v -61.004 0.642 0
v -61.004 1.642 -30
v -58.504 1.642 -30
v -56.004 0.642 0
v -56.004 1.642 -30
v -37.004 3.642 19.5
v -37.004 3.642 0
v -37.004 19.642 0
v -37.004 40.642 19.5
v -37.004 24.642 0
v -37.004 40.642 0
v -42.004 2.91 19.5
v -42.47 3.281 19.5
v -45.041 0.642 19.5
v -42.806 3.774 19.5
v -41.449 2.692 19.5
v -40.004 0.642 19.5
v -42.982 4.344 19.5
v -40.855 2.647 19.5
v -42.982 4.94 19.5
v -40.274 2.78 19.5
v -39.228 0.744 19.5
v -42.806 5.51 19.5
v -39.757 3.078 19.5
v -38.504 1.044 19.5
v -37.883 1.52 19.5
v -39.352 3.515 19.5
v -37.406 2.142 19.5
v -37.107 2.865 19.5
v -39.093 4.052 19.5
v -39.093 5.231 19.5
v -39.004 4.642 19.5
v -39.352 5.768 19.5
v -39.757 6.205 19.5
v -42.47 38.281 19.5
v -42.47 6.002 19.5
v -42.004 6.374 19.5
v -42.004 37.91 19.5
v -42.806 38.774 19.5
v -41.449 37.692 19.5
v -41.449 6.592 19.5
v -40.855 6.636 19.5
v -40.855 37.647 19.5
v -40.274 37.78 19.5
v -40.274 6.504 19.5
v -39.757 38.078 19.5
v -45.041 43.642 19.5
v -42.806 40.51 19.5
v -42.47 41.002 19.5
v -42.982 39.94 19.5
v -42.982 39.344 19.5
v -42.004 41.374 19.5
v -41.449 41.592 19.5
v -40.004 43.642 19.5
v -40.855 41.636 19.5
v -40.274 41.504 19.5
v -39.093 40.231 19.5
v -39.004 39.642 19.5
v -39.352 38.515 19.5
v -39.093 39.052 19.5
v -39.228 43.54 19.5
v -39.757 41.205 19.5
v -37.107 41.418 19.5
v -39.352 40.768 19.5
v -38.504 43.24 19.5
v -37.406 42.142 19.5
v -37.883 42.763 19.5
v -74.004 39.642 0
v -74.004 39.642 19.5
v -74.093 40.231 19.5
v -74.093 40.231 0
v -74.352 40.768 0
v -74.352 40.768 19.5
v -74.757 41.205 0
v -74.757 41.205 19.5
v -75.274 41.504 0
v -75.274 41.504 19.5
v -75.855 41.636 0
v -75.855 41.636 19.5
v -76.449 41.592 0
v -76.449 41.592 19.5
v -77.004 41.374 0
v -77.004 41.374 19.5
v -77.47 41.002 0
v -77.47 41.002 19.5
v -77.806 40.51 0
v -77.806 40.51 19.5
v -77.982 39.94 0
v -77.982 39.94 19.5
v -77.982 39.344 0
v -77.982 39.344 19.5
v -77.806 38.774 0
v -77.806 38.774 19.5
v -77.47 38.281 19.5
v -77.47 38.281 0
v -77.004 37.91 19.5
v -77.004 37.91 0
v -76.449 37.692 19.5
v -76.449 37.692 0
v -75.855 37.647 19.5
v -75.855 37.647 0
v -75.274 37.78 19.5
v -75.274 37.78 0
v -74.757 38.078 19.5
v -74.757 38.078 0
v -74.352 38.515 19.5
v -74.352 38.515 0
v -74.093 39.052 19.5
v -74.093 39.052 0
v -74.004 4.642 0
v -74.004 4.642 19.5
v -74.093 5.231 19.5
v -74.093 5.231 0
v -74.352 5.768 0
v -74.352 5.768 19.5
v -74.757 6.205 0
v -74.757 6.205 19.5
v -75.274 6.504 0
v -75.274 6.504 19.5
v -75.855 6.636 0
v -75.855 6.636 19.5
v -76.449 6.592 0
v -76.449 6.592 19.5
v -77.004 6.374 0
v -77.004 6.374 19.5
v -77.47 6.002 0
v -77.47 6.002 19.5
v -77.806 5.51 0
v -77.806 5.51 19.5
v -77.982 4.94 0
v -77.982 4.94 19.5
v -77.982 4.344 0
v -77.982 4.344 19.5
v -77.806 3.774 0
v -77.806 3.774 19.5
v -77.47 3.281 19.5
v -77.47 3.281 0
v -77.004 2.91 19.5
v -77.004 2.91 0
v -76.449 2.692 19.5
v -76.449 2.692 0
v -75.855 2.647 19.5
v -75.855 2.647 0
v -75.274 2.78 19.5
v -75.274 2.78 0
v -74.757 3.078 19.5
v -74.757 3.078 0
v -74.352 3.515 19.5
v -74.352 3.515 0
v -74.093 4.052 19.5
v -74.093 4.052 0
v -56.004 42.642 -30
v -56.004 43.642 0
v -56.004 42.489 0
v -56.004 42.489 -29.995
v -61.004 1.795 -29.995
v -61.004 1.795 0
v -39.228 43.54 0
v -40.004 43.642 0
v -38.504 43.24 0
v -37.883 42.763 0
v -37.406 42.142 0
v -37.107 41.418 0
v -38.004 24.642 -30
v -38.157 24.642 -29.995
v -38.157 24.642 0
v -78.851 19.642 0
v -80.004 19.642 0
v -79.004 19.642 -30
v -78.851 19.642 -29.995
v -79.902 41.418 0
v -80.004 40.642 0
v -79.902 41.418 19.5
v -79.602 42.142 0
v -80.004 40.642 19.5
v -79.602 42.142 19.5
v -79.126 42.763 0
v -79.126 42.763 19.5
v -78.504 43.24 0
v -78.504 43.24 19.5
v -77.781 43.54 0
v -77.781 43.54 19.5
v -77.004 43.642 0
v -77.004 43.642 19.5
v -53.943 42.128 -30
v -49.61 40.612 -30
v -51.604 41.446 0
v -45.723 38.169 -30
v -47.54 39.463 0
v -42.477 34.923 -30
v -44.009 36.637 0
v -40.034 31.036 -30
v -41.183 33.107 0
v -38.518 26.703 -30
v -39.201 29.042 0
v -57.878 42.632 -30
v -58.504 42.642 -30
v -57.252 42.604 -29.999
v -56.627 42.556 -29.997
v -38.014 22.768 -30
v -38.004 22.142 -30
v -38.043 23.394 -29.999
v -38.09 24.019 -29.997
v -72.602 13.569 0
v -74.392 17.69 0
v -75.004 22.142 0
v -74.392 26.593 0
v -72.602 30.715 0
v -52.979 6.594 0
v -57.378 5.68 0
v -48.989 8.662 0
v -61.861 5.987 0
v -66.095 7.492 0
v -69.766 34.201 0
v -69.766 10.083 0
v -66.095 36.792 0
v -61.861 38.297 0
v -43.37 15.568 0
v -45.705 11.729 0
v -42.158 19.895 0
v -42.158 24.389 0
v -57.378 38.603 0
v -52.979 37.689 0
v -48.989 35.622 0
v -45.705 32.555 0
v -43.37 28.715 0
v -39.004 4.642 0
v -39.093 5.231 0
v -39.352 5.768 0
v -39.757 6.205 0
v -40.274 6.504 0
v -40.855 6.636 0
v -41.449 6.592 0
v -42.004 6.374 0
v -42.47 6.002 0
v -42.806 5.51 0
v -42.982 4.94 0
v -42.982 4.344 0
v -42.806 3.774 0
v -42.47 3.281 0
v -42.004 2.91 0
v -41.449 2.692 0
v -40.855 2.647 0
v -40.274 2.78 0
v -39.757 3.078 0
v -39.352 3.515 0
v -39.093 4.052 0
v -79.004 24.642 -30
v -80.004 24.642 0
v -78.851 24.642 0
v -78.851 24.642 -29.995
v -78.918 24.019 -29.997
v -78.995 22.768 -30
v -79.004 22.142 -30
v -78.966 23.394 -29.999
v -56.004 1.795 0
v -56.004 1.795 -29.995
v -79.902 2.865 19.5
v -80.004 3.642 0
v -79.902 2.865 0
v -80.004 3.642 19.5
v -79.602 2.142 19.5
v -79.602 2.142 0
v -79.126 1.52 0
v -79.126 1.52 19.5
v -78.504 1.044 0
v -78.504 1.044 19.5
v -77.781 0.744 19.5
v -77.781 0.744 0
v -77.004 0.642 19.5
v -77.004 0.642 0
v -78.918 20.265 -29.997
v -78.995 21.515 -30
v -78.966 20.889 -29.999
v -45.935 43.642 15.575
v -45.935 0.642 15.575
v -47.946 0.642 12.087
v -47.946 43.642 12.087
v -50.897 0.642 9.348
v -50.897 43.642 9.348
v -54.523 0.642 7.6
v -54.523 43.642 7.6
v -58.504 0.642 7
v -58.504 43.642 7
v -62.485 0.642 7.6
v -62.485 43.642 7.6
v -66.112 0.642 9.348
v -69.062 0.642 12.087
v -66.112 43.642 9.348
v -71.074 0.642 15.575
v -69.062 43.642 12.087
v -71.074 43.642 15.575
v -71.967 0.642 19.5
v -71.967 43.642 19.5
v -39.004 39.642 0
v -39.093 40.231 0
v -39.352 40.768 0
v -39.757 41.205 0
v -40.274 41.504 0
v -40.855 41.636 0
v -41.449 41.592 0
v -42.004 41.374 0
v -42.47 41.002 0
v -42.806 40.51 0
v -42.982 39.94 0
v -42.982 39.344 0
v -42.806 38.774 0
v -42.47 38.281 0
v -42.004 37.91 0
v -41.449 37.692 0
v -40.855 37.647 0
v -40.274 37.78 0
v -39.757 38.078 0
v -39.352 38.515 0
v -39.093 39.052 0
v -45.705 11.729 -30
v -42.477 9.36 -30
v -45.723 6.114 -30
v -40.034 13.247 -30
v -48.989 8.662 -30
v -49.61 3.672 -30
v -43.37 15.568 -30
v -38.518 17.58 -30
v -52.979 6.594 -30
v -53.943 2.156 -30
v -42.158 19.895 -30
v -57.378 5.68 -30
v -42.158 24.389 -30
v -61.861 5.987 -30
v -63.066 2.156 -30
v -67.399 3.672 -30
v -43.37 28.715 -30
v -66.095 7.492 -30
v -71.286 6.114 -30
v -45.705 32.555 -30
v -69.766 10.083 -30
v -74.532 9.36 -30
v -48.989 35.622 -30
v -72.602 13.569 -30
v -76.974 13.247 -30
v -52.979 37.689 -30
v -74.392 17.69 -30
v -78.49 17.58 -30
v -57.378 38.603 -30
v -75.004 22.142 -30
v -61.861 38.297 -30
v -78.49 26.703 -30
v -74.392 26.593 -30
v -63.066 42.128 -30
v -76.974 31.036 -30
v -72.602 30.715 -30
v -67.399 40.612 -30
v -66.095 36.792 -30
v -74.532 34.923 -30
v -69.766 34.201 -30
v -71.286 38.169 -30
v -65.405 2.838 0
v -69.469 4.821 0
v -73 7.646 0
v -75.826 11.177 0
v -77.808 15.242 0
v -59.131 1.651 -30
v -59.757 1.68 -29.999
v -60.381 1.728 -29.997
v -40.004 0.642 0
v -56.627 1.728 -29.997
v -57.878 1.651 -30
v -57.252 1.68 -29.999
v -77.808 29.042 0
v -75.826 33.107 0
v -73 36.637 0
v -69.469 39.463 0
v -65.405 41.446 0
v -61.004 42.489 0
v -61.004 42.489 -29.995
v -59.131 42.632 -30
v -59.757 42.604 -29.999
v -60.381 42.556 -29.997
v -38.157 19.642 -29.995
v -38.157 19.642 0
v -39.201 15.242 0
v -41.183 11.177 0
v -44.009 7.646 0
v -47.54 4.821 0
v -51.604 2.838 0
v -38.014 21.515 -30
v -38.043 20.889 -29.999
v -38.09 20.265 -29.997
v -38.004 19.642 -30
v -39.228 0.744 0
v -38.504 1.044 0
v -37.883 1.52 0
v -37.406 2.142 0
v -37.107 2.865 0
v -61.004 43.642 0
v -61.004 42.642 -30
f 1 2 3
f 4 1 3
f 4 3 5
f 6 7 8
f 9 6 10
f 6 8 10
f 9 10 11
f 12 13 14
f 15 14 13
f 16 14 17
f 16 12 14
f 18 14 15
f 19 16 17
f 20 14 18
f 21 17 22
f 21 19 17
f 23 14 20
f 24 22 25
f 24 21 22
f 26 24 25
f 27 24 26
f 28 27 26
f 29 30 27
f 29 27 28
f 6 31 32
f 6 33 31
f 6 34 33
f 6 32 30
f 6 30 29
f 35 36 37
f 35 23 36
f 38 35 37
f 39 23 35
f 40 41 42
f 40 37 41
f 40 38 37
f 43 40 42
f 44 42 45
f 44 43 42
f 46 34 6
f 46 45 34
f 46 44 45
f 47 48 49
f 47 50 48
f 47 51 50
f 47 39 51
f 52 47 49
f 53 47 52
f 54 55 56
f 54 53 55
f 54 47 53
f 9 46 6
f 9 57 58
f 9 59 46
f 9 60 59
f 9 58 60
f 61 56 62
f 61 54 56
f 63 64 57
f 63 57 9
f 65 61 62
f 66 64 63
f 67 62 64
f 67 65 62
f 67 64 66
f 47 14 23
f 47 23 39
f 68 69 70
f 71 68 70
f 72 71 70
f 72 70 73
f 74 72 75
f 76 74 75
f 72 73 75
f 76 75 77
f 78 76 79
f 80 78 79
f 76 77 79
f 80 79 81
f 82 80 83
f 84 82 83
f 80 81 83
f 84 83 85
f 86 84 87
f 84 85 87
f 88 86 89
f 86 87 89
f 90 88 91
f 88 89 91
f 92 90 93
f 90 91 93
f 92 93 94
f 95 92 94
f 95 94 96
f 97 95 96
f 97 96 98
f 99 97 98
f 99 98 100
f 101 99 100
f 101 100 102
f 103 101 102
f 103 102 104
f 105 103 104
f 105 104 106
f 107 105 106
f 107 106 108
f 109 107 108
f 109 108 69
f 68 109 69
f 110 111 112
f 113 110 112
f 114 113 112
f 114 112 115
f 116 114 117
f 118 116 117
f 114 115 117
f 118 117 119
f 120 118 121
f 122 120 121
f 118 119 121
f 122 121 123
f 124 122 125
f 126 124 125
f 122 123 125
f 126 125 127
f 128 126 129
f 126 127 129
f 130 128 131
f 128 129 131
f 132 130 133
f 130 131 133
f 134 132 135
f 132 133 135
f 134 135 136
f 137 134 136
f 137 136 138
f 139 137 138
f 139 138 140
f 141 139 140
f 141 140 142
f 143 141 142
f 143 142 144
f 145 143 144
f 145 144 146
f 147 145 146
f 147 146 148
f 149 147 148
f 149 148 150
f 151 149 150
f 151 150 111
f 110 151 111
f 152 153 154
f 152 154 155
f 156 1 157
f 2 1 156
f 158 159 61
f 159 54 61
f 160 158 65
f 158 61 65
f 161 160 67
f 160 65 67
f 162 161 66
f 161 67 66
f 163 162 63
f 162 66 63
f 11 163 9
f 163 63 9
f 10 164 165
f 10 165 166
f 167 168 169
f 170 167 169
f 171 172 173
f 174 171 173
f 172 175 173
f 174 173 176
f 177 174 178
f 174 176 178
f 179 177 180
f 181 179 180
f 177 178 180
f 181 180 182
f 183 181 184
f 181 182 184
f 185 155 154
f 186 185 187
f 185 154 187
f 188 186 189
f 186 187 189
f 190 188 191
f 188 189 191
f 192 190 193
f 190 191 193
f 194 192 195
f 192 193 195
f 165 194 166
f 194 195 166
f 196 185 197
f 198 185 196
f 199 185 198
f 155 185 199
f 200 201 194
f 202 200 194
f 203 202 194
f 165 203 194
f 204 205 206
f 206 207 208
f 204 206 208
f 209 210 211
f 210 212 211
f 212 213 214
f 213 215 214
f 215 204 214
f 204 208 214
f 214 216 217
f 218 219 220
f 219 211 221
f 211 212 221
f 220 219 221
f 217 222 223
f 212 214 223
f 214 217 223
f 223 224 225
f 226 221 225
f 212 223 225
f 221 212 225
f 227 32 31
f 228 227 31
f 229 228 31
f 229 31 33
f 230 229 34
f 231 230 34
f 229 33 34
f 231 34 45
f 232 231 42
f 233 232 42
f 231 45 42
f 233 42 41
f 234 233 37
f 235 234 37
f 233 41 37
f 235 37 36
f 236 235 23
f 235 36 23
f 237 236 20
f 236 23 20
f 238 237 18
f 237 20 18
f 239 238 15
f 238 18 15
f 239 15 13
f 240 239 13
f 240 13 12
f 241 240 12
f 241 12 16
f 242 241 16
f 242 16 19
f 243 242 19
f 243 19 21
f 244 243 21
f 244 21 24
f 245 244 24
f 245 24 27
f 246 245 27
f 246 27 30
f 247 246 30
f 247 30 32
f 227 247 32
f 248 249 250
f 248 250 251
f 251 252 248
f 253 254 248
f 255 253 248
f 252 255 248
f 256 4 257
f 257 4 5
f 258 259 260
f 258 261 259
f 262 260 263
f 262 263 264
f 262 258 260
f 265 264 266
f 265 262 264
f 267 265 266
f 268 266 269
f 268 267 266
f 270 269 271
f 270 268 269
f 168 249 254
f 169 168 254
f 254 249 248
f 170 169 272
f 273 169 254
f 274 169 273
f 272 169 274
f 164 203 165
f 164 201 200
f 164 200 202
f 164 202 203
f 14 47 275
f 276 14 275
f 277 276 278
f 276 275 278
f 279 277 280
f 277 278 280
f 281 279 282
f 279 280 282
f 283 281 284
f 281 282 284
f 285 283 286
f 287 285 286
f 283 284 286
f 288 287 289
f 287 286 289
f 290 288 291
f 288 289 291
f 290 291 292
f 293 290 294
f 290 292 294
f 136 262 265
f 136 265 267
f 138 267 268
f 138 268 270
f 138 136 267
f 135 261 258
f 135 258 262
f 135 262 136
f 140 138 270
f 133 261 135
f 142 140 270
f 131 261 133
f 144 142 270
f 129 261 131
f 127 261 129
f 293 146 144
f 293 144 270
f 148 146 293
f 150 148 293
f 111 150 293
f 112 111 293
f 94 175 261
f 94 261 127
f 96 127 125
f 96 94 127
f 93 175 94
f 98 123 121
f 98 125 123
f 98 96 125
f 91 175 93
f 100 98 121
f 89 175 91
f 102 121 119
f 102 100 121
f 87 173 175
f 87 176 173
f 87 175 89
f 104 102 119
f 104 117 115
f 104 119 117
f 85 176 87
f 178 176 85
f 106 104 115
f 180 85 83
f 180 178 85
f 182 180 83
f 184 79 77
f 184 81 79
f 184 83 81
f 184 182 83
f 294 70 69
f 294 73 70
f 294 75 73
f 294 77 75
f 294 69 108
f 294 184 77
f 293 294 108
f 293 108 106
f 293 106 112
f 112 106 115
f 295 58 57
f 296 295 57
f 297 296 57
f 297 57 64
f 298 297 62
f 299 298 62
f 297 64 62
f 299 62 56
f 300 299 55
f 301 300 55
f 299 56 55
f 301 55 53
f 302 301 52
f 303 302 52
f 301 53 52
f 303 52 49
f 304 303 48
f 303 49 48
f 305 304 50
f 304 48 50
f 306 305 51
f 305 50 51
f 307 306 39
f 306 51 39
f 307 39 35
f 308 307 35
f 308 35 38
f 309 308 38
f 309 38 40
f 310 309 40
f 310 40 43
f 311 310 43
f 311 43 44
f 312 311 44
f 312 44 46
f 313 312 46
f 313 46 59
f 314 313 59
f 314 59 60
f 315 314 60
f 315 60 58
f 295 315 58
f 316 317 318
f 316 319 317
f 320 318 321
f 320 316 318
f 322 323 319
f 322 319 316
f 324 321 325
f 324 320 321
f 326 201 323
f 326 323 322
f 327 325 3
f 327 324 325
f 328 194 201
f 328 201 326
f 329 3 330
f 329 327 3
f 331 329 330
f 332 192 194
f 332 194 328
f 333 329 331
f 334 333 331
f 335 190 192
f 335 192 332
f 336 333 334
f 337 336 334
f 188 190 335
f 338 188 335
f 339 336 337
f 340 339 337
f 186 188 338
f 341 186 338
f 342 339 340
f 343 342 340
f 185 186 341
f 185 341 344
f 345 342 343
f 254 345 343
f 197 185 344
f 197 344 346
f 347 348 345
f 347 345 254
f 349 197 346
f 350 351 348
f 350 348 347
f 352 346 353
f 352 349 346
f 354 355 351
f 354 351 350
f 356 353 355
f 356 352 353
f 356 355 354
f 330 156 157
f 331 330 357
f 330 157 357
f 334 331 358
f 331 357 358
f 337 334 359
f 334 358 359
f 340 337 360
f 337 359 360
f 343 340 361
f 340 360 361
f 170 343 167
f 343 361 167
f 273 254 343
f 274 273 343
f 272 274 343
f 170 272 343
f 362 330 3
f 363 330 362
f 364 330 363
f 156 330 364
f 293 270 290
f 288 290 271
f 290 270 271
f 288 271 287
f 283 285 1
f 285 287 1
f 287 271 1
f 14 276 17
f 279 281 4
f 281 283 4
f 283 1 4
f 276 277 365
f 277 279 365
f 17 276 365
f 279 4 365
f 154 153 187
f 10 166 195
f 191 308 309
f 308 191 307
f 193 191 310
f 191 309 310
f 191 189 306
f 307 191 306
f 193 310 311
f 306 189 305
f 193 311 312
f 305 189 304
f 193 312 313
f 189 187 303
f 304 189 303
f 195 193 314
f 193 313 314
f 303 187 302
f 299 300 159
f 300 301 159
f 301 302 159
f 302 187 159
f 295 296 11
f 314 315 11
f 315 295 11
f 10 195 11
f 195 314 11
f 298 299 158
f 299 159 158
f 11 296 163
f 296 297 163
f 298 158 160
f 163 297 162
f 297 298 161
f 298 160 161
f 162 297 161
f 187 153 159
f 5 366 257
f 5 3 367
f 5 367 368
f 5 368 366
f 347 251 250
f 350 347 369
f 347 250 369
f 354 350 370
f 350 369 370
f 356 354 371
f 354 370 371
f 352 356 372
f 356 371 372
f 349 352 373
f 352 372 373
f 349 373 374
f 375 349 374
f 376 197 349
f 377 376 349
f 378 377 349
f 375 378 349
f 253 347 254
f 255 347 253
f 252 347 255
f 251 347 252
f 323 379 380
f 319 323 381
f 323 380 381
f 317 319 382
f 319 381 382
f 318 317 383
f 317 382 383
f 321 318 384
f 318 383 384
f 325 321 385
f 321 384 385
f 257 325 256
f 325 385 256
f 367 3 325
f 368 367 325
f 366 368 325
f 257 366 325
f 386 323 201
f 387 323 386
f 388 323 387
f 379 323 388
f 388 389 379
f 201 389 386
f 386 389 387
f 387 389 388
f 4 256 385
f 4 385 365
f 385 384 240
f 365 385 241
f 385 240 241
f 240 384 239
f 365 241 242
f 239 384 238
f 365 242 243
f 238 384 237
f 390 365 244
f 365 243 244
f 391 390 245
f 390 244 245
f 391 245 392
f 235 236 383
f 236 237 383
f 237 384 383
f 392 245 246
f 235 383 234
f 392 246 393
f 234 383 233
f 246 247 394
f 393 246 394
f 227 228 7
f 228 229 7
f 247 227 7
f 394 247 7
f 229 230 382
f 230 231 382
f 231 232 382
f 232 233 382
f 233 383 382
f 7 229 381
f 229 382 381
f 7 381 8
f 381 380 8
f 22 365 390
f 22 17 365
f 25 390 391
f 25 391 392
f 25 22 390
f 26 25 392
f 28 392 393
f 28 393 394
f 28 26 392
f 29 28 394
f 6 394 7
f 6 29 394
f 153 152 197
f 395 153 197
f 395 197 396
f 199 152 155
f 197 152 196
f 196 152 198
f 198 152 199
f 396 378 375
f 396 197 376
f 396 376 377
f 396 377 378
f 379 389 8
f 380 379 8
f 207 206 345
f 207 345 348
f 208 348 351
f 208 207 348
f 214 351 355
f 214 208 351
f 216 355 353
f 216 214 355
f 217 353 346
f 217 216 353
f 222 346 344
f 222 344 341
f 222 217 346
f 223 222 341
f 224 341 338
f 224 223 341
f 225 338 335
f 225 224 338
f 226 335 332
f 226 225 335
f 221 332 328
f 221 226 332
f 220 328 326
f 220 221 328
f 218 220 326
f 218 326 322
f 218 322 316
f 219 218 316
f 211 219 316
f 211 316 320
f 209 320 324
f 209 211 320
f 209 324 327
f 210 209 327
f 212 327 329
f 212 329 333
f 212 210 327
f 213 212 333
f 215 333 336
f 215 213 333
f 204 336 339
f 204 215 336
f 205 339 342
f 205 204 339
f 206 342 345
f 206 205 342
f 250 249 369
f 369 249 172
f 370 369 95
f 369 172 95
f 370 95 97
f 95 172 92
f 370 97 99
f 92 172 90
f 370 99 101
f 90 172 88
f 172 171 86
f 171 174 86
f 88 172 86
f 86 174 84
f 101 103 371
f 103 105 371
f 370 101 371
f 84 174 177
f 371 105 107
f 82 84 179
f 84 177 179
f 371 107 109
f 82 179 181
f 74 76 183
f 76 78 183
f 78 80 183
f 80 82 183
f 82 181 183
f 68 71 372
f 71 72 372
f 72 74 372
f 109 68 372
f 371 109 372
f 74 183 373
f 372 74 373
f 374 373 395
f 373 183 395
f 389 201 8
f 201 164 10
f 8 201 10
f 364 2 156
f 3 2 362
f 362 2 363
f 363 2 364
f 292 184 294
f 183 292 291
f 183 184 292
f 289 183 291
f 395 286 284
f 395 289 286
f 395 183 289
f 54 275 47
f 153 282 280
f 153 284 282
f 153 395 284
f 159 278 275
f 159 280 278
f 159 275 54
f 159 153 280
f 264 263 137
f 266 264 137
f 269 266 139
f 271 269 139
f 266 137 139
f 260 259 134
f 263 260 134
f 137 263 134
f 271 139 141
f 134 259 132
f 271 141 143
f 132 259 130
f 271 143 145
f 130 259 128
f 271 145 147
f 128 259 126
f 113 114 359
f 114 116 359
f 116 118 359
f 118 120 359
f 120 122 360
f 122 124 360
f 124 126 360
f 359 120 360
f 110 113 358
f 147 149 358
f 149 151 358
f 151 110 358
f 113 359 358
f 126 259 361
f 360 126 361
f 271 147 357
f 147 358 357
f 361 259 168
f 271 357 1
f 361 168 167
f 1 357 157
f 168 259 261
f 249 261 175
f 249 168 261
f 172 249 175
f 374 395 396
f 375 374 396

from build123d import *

# Parameters (mm, degrees)
CROQUIS1_W              = 43
CROQUIS1_H              = 43
SALIENTE_EXTRUIR1_DEPTH = 19.5
CROQUIS2_R              = 13.5
CORTAR_EXTRUIR1_DEPTH   = 44
CROQUIS3_R              = 2
CORTAR_EXTRUIR2_DEPTH   = 20.5
REDONDEO1_R             = 3
CROQUIS5_R              = 20.5
CROQUIS5_R_2            = 16.5
SALIENTE_EXTRUIR2_DEPTH = 30
EXTRUIR_L_MINA1_REACH   = 45.626
CROQUIS7_W              = 5
CROQUIS7_H              = 30.01666204
EXTRUIR_L_MINA2_REACH   = 45.626
CROQUIS8_W              = 30.01666204
CROQUIS8_H              = 5
EXTRUIR_L_MINA3_REACH   = 45.626
CROQUIS9_W              = 5
CROQUIS9_H              = 30.016662039
EXTRUIR_L_MINA4_REACH   = 45.626
CROQUIS10_W             = 30.016662039
CROQUIS10_H             = 5


with BuildPart() as part:
    # Croquis1 → Saliente-Extruir1 (new body)
    with BuildSketch(Plane.XY):
        with Locations((-58.504320503, 22.141791045)):
            Rectangle(CROQUIS1_W, CROQUIS1_H)
    extrude(amount=SALIENTE_EXTRUIR1_DEPTH)

    # Croquis2 → Cortar-Extruir1 (cut, through all)
    with BuildSketch(Plane(origin=(0, 43.641791045, 0), x_dir=(1, 0, 0), z_dir=(0, 1, 0))):
        with Locations((-58.504320503, -20.5)):
            Circle(CROQUIS2_R)
    extrude(amount=-CORTAR_EXTRUIR1_DEPTH, mode=Mode.SUBTRACT)

    # Croquis3 → Cortar-Extruir2 (cut, through all)
    with BuildSketch(Plane.XY.offset(19.5)):
        with Locations((-76.004320503, 39.641791045)):
            Circle(CROQUIS3_R)
        with Locations((-41.004320503, 39.641791045)):
            Circle(CROQUIS3_R)
        with Locations((-41.004320503, 4.641791045)):
            Circle(CROQUIS3_R)
        with Locations((-76.004320503, 4.641791045)):
            Circle(CROQUIS3_R)
    extrude(amount=-CORTAR_EXTRUIR2_DEPTH, mode=Mode.SUBTRACT)

    # Redondeo1
    redondeo1_edges = [part.edges().sort_by_distance(p)[0] for p in [
        (-80.004320503, 43.641791045, 9.75),
        (-37.004320503, 43.641791045, 9.75),
        (-37.004320503, 0.641791045, 9.75),
        (-80.004320503, 0.641791045, 9.75),
    ]]
    fillet(redondeo1_edges, radius=REDONDEO1_R)

    # Croquis5 → Saliente-Extruir2 (add)
    with BuildSketch(Plane(origin=(0, 0, 0), x_dir=(-1, 0, 0), z_dir=(0, 0, -1))):
        with Locations((58.504320503, 22.141791045)):
            Circle(CROQUIS5_R)
        with Locations((58.504320503, 22.141791045)):
            Circle(CROQUIS5_R_2, mode=Mode.SUBTRACT)
    extrude(amount=SALIENTE_EXTRUIR2_DEPTH)

    # Croquis7 → Extruir-Lámina1 (add, up to next)
    with BuildSketch(Plane(origin=(0, 43.593353985, -1.453111799), x_dir=(-1, 0, 0), z_dir=(0, -0.999444907, 0.03331483)), mode=Mode.PRIVATE) as extruir_l_mina1_sk1:
        with Locations((58.504320503, 13.55441216)):
            Rectangle(CROQUIS7_W, CROQUIS7_H)
    extruir_l_mina1_tool1 = extrude(extruir_l_mina1_sk1.sketch, amount=EXTRUIR_L_MINA1_REACH, mode=Mode.PRIVATE) - part.part
    add(extruir_l_mina1_tool1.solids().sort_by_distance((-58.504321, 43.141791, -15))[0])

    # Croquis8 → Extruir-Lámina2 (add, up to next)
    with BuildSketch(Plane(origin=(-36.963250225, 0, 1.232108341), x_dir=(0.03331483, 0, 0.999444907), z_dir=(-0.999444907, 0, 0.03331483)), mode=Mode.PRIVATE) as extruir_l_mina2_sk1:
        with Locations((-16.241123675, 22.141791045)):
            Rectangle(CROQUIS8_W, CROQUIS8_H)
    extruir_l_mina2_tool1 = extrude(extruir_l_mina2_sk1.sketch, amount=EXTRUIR_L_MINA2_REACH, mode=Mode.PRIVATE) - part.part
    add(extruir_l_mina2_tool1.solids().sort_by_distance((-37.504321, 22.141791, -15))[0])

    # Croquis9 → Extruir-Lámina3 (add, up to next)
    with BuildSketch(Plane(origin=(0, 0.641078735, 0.021369291), x_dir=(1, 0, 0), z_dir=(0, 0.999444907, 0.03331483)), mode=Mode.PRIVATE) as extruir_l_mina3_sk1:
        with Locations((-58.504320503, 15.02971218)):
            Rectangle(CROQUIS9_W, CROQUIS9_H)
    extruir_l_mina3_tool1 = extrude(extruir_l_mina3_sk1.sketch, amount=EXTRUIR_L_MINA3_REACH, mode=Mode.PRIVATE) - part.part
    add(extruir_l_mina3_tool1.solids().sort_by_distance((-58.504321, 1.141791, -15))[0])

    # Croquis10 → Extruir-Lámina4 (add, up to next)
    with BuildSketch(Plane(origin=(-79.915525474, 0, -2.663850849), x_dir=(0.03331483, 0, -0.999444907), z_dir=(0.999444907, 0, 0.03331483)), mode=Mode.PRIVATE) as extruir_l_mina4_sk1:
        with Locations((12.343000664, 22.141791045)):
            Rectangle(CROQUIS10_W, CROQUIS10_H)
    extruir_l_mina4_tool1 = extrude(extruir_l_mina4_sk1.sketch, amount=EXTRUIR_L_MINA4_REACH, mode=Mode.PRIVATE) - part.part
    add(extruir_l_mina4_tool1.solids().sort_by_distance((-79.504321, 22.141791, -15))[0])


solid = part.part
